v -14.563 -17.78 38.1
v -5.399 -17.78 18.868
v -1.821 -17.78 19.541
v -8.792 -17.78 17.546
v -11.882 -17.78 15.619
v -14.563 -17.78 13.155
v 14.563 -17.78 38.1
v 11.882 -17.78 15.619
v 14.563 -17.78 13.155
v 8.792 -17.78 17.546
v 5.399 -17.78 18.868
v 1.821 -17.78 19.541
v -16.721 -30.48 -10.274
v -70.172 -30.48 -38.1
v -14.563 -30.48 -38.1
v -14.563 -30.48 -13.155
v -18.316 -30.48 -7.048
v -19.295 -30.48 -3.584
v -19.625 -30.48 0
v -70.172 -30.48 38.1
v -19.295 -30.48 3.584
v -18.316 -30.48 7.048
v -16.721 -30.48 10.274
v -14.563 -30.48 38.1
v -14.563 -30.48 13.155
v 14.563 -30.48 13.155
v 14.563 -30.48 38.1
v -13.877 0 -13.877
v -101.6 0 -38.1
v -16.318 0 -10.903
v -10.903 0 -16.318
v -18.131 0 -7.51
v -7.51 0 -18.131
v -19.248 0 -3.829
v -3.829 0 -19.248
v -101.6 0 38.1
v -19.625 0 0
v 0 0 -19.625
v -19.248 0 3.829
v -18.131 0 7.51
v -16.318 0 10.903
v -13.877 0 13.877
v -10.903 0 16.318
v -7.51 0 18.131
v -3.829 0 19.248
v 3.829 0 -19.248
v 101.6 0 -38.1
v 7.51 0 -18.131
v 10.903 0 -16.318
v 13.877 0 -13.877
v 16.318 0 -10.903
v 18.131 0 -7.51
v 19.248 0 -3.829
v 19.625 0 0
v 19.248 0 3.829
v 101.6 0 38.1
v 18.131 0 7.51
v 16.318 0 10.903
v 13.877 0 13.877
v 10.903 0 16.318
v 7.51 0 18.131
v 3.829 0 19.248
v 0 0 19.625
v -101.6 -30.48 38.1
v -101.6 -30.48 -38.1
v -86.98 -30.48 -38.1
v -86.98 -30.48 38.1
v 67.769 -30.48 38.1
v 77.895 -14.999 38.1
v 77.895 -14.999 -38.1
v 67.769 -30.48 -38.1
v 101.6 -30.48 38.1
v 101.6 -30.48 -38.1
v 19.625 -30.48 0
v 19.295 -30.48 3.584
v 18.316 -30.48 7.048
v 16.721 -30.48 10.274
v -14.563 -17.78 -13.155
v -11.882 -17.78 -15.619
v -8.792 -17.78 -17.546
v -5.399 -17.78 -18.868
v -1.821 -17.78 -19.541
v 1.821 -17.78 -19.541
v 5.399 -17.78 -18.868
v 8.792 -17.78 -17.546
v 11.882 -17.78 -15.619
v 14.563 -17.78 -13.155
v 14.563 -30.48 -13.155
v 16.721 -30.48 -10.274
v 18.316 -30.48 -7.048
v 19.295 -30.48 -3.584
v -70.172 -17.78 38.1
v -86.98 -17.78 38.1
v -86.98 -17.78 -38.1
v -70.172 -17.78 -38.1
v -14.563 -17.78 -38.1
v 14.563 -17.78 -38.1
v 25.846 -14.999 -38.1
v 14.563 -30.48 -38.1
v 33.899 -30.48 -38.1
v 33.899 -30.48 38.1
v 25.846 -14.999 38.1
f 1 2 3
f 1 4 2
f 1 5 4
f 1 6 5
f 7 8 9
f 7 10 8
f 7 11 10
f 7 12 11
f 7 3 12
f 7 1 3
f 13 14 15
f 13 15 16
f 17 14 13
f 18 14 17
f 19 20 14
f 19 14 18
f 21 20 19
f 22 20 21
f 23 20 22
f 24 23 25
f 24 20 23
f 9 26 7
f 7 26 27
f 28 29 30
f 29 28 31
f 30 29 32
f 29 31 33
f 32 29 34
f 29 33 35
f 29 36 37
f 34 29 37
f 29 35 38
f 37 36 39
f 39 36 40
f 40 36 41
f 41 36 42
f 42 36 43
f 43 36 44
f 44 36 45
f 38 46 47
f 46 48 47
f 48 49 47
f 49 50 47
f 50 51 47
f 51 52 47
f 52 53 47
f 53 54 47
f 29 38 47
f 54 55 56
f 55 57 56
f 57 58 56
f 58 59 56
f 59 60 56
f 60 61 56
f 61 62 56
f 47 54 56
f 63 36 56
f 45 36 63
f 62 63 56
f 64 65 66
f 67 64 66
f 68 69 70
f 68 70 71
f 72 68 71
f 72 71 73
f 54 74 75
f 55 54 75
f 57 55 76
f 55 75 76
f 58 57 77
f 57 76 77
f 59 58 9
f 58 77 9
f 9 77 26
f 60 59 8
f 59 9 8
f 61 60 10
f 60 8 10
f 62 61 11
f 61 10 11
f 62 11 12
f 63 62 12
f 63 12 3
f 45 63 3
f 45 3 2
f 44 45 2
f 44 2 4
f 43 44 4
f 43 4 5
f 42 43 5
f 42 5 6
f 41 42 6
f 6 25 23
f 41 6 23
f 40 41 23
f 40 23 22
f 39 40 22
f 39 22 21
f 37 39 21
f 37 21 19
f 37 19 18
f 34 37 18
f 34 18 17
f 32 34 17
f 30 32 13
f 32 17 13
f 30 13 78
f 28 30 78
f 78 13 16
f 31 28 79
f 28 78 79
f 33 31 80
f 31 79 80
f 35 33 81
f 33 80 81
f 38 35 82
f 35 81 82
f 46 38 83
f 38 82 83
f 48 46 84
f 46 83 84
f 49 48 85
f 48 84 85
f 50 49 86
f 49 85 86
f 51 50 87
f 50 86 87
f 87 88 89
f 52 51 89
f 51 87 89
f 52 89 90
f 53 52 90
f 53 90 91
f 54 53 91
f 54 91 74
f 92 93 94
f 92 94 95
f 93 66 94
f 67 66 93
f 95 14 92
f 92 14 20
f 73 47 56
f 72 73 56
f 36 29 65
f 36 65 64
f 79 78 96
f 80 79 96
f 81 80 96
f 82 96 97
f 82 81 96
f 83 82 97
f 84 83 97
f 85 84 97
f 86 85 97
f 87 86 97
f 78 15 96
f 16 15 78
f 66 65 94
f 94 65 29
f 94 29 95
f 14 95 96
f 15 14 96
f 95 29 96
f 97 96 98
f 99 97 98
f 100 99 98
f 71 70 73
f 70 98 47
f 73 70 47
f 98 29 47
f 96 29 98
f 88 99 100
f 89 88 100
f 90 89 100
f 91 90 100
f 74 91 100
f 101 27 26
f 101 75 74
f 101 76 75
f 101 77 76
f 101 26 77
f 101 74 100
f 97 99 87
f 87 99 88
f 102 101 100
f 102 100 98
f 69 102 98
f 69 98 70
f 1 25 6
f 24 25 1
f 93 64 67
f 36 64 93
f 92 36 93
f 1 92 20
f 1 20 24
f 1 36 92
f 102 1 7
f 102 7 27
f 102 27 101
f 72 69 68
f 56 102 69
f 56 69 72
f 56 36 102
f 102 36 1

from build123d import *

# Parameters (mm, degrees)
F0_W     = 203.2
F0_H     = 76.2
F1_DEPTH = 30.48
F2_R     = 19.62516
F3_DEPTH = 30.481
F4_W     = 16.807922
F4_H     = 76.2
F4_W_2   = 29.126016
F5_DEPTH = 12.7
F7_DEPTH = 76.201


with BuildPart() as f1:
    # F0 (on Front) → F1 (new body)
    with BuildSketch(Plane.XZ):
        Rectangle(F0_W, F0_H)
    extrude(amount=F1_DEPTH)

    # F2 (on face) → F3 (cut, through all)
    with BuildSketch(Plane.XZ.offset(30.48)):
        Circle(F2_R)
    extrude(amount=-F3_DEPTH, mode=Mode.SUBTRACT)

    # F4 (on face) → F5 (cut)
    with BuildSketch(Plane.XZ.offset(30.48)):
        with Locations((-78.576129, 0)):
            Rectangle(F4_W, F4_H)
        Rectangle(F4_W_2, F4_H)
    extrude(amount=-F5_DEPTH, mode=Mode.SUBTRACT)

    # F6 (on face) → F7 (cut, through all)
    with BuildSketch(Plane(origin=(0, 0, -38.1), x_dir=(1, 0, 0), z_dir=(0, 0, -1))):
        Polygon((67.76917, 30.48), (33.899248, 30.48), (25.846235, 14.998903), (77.894919, 14.998903), align=None)
    extrude(amount=-F7_DEPTH, mode=Mode.SUBTRACT)


solid = f1.part
